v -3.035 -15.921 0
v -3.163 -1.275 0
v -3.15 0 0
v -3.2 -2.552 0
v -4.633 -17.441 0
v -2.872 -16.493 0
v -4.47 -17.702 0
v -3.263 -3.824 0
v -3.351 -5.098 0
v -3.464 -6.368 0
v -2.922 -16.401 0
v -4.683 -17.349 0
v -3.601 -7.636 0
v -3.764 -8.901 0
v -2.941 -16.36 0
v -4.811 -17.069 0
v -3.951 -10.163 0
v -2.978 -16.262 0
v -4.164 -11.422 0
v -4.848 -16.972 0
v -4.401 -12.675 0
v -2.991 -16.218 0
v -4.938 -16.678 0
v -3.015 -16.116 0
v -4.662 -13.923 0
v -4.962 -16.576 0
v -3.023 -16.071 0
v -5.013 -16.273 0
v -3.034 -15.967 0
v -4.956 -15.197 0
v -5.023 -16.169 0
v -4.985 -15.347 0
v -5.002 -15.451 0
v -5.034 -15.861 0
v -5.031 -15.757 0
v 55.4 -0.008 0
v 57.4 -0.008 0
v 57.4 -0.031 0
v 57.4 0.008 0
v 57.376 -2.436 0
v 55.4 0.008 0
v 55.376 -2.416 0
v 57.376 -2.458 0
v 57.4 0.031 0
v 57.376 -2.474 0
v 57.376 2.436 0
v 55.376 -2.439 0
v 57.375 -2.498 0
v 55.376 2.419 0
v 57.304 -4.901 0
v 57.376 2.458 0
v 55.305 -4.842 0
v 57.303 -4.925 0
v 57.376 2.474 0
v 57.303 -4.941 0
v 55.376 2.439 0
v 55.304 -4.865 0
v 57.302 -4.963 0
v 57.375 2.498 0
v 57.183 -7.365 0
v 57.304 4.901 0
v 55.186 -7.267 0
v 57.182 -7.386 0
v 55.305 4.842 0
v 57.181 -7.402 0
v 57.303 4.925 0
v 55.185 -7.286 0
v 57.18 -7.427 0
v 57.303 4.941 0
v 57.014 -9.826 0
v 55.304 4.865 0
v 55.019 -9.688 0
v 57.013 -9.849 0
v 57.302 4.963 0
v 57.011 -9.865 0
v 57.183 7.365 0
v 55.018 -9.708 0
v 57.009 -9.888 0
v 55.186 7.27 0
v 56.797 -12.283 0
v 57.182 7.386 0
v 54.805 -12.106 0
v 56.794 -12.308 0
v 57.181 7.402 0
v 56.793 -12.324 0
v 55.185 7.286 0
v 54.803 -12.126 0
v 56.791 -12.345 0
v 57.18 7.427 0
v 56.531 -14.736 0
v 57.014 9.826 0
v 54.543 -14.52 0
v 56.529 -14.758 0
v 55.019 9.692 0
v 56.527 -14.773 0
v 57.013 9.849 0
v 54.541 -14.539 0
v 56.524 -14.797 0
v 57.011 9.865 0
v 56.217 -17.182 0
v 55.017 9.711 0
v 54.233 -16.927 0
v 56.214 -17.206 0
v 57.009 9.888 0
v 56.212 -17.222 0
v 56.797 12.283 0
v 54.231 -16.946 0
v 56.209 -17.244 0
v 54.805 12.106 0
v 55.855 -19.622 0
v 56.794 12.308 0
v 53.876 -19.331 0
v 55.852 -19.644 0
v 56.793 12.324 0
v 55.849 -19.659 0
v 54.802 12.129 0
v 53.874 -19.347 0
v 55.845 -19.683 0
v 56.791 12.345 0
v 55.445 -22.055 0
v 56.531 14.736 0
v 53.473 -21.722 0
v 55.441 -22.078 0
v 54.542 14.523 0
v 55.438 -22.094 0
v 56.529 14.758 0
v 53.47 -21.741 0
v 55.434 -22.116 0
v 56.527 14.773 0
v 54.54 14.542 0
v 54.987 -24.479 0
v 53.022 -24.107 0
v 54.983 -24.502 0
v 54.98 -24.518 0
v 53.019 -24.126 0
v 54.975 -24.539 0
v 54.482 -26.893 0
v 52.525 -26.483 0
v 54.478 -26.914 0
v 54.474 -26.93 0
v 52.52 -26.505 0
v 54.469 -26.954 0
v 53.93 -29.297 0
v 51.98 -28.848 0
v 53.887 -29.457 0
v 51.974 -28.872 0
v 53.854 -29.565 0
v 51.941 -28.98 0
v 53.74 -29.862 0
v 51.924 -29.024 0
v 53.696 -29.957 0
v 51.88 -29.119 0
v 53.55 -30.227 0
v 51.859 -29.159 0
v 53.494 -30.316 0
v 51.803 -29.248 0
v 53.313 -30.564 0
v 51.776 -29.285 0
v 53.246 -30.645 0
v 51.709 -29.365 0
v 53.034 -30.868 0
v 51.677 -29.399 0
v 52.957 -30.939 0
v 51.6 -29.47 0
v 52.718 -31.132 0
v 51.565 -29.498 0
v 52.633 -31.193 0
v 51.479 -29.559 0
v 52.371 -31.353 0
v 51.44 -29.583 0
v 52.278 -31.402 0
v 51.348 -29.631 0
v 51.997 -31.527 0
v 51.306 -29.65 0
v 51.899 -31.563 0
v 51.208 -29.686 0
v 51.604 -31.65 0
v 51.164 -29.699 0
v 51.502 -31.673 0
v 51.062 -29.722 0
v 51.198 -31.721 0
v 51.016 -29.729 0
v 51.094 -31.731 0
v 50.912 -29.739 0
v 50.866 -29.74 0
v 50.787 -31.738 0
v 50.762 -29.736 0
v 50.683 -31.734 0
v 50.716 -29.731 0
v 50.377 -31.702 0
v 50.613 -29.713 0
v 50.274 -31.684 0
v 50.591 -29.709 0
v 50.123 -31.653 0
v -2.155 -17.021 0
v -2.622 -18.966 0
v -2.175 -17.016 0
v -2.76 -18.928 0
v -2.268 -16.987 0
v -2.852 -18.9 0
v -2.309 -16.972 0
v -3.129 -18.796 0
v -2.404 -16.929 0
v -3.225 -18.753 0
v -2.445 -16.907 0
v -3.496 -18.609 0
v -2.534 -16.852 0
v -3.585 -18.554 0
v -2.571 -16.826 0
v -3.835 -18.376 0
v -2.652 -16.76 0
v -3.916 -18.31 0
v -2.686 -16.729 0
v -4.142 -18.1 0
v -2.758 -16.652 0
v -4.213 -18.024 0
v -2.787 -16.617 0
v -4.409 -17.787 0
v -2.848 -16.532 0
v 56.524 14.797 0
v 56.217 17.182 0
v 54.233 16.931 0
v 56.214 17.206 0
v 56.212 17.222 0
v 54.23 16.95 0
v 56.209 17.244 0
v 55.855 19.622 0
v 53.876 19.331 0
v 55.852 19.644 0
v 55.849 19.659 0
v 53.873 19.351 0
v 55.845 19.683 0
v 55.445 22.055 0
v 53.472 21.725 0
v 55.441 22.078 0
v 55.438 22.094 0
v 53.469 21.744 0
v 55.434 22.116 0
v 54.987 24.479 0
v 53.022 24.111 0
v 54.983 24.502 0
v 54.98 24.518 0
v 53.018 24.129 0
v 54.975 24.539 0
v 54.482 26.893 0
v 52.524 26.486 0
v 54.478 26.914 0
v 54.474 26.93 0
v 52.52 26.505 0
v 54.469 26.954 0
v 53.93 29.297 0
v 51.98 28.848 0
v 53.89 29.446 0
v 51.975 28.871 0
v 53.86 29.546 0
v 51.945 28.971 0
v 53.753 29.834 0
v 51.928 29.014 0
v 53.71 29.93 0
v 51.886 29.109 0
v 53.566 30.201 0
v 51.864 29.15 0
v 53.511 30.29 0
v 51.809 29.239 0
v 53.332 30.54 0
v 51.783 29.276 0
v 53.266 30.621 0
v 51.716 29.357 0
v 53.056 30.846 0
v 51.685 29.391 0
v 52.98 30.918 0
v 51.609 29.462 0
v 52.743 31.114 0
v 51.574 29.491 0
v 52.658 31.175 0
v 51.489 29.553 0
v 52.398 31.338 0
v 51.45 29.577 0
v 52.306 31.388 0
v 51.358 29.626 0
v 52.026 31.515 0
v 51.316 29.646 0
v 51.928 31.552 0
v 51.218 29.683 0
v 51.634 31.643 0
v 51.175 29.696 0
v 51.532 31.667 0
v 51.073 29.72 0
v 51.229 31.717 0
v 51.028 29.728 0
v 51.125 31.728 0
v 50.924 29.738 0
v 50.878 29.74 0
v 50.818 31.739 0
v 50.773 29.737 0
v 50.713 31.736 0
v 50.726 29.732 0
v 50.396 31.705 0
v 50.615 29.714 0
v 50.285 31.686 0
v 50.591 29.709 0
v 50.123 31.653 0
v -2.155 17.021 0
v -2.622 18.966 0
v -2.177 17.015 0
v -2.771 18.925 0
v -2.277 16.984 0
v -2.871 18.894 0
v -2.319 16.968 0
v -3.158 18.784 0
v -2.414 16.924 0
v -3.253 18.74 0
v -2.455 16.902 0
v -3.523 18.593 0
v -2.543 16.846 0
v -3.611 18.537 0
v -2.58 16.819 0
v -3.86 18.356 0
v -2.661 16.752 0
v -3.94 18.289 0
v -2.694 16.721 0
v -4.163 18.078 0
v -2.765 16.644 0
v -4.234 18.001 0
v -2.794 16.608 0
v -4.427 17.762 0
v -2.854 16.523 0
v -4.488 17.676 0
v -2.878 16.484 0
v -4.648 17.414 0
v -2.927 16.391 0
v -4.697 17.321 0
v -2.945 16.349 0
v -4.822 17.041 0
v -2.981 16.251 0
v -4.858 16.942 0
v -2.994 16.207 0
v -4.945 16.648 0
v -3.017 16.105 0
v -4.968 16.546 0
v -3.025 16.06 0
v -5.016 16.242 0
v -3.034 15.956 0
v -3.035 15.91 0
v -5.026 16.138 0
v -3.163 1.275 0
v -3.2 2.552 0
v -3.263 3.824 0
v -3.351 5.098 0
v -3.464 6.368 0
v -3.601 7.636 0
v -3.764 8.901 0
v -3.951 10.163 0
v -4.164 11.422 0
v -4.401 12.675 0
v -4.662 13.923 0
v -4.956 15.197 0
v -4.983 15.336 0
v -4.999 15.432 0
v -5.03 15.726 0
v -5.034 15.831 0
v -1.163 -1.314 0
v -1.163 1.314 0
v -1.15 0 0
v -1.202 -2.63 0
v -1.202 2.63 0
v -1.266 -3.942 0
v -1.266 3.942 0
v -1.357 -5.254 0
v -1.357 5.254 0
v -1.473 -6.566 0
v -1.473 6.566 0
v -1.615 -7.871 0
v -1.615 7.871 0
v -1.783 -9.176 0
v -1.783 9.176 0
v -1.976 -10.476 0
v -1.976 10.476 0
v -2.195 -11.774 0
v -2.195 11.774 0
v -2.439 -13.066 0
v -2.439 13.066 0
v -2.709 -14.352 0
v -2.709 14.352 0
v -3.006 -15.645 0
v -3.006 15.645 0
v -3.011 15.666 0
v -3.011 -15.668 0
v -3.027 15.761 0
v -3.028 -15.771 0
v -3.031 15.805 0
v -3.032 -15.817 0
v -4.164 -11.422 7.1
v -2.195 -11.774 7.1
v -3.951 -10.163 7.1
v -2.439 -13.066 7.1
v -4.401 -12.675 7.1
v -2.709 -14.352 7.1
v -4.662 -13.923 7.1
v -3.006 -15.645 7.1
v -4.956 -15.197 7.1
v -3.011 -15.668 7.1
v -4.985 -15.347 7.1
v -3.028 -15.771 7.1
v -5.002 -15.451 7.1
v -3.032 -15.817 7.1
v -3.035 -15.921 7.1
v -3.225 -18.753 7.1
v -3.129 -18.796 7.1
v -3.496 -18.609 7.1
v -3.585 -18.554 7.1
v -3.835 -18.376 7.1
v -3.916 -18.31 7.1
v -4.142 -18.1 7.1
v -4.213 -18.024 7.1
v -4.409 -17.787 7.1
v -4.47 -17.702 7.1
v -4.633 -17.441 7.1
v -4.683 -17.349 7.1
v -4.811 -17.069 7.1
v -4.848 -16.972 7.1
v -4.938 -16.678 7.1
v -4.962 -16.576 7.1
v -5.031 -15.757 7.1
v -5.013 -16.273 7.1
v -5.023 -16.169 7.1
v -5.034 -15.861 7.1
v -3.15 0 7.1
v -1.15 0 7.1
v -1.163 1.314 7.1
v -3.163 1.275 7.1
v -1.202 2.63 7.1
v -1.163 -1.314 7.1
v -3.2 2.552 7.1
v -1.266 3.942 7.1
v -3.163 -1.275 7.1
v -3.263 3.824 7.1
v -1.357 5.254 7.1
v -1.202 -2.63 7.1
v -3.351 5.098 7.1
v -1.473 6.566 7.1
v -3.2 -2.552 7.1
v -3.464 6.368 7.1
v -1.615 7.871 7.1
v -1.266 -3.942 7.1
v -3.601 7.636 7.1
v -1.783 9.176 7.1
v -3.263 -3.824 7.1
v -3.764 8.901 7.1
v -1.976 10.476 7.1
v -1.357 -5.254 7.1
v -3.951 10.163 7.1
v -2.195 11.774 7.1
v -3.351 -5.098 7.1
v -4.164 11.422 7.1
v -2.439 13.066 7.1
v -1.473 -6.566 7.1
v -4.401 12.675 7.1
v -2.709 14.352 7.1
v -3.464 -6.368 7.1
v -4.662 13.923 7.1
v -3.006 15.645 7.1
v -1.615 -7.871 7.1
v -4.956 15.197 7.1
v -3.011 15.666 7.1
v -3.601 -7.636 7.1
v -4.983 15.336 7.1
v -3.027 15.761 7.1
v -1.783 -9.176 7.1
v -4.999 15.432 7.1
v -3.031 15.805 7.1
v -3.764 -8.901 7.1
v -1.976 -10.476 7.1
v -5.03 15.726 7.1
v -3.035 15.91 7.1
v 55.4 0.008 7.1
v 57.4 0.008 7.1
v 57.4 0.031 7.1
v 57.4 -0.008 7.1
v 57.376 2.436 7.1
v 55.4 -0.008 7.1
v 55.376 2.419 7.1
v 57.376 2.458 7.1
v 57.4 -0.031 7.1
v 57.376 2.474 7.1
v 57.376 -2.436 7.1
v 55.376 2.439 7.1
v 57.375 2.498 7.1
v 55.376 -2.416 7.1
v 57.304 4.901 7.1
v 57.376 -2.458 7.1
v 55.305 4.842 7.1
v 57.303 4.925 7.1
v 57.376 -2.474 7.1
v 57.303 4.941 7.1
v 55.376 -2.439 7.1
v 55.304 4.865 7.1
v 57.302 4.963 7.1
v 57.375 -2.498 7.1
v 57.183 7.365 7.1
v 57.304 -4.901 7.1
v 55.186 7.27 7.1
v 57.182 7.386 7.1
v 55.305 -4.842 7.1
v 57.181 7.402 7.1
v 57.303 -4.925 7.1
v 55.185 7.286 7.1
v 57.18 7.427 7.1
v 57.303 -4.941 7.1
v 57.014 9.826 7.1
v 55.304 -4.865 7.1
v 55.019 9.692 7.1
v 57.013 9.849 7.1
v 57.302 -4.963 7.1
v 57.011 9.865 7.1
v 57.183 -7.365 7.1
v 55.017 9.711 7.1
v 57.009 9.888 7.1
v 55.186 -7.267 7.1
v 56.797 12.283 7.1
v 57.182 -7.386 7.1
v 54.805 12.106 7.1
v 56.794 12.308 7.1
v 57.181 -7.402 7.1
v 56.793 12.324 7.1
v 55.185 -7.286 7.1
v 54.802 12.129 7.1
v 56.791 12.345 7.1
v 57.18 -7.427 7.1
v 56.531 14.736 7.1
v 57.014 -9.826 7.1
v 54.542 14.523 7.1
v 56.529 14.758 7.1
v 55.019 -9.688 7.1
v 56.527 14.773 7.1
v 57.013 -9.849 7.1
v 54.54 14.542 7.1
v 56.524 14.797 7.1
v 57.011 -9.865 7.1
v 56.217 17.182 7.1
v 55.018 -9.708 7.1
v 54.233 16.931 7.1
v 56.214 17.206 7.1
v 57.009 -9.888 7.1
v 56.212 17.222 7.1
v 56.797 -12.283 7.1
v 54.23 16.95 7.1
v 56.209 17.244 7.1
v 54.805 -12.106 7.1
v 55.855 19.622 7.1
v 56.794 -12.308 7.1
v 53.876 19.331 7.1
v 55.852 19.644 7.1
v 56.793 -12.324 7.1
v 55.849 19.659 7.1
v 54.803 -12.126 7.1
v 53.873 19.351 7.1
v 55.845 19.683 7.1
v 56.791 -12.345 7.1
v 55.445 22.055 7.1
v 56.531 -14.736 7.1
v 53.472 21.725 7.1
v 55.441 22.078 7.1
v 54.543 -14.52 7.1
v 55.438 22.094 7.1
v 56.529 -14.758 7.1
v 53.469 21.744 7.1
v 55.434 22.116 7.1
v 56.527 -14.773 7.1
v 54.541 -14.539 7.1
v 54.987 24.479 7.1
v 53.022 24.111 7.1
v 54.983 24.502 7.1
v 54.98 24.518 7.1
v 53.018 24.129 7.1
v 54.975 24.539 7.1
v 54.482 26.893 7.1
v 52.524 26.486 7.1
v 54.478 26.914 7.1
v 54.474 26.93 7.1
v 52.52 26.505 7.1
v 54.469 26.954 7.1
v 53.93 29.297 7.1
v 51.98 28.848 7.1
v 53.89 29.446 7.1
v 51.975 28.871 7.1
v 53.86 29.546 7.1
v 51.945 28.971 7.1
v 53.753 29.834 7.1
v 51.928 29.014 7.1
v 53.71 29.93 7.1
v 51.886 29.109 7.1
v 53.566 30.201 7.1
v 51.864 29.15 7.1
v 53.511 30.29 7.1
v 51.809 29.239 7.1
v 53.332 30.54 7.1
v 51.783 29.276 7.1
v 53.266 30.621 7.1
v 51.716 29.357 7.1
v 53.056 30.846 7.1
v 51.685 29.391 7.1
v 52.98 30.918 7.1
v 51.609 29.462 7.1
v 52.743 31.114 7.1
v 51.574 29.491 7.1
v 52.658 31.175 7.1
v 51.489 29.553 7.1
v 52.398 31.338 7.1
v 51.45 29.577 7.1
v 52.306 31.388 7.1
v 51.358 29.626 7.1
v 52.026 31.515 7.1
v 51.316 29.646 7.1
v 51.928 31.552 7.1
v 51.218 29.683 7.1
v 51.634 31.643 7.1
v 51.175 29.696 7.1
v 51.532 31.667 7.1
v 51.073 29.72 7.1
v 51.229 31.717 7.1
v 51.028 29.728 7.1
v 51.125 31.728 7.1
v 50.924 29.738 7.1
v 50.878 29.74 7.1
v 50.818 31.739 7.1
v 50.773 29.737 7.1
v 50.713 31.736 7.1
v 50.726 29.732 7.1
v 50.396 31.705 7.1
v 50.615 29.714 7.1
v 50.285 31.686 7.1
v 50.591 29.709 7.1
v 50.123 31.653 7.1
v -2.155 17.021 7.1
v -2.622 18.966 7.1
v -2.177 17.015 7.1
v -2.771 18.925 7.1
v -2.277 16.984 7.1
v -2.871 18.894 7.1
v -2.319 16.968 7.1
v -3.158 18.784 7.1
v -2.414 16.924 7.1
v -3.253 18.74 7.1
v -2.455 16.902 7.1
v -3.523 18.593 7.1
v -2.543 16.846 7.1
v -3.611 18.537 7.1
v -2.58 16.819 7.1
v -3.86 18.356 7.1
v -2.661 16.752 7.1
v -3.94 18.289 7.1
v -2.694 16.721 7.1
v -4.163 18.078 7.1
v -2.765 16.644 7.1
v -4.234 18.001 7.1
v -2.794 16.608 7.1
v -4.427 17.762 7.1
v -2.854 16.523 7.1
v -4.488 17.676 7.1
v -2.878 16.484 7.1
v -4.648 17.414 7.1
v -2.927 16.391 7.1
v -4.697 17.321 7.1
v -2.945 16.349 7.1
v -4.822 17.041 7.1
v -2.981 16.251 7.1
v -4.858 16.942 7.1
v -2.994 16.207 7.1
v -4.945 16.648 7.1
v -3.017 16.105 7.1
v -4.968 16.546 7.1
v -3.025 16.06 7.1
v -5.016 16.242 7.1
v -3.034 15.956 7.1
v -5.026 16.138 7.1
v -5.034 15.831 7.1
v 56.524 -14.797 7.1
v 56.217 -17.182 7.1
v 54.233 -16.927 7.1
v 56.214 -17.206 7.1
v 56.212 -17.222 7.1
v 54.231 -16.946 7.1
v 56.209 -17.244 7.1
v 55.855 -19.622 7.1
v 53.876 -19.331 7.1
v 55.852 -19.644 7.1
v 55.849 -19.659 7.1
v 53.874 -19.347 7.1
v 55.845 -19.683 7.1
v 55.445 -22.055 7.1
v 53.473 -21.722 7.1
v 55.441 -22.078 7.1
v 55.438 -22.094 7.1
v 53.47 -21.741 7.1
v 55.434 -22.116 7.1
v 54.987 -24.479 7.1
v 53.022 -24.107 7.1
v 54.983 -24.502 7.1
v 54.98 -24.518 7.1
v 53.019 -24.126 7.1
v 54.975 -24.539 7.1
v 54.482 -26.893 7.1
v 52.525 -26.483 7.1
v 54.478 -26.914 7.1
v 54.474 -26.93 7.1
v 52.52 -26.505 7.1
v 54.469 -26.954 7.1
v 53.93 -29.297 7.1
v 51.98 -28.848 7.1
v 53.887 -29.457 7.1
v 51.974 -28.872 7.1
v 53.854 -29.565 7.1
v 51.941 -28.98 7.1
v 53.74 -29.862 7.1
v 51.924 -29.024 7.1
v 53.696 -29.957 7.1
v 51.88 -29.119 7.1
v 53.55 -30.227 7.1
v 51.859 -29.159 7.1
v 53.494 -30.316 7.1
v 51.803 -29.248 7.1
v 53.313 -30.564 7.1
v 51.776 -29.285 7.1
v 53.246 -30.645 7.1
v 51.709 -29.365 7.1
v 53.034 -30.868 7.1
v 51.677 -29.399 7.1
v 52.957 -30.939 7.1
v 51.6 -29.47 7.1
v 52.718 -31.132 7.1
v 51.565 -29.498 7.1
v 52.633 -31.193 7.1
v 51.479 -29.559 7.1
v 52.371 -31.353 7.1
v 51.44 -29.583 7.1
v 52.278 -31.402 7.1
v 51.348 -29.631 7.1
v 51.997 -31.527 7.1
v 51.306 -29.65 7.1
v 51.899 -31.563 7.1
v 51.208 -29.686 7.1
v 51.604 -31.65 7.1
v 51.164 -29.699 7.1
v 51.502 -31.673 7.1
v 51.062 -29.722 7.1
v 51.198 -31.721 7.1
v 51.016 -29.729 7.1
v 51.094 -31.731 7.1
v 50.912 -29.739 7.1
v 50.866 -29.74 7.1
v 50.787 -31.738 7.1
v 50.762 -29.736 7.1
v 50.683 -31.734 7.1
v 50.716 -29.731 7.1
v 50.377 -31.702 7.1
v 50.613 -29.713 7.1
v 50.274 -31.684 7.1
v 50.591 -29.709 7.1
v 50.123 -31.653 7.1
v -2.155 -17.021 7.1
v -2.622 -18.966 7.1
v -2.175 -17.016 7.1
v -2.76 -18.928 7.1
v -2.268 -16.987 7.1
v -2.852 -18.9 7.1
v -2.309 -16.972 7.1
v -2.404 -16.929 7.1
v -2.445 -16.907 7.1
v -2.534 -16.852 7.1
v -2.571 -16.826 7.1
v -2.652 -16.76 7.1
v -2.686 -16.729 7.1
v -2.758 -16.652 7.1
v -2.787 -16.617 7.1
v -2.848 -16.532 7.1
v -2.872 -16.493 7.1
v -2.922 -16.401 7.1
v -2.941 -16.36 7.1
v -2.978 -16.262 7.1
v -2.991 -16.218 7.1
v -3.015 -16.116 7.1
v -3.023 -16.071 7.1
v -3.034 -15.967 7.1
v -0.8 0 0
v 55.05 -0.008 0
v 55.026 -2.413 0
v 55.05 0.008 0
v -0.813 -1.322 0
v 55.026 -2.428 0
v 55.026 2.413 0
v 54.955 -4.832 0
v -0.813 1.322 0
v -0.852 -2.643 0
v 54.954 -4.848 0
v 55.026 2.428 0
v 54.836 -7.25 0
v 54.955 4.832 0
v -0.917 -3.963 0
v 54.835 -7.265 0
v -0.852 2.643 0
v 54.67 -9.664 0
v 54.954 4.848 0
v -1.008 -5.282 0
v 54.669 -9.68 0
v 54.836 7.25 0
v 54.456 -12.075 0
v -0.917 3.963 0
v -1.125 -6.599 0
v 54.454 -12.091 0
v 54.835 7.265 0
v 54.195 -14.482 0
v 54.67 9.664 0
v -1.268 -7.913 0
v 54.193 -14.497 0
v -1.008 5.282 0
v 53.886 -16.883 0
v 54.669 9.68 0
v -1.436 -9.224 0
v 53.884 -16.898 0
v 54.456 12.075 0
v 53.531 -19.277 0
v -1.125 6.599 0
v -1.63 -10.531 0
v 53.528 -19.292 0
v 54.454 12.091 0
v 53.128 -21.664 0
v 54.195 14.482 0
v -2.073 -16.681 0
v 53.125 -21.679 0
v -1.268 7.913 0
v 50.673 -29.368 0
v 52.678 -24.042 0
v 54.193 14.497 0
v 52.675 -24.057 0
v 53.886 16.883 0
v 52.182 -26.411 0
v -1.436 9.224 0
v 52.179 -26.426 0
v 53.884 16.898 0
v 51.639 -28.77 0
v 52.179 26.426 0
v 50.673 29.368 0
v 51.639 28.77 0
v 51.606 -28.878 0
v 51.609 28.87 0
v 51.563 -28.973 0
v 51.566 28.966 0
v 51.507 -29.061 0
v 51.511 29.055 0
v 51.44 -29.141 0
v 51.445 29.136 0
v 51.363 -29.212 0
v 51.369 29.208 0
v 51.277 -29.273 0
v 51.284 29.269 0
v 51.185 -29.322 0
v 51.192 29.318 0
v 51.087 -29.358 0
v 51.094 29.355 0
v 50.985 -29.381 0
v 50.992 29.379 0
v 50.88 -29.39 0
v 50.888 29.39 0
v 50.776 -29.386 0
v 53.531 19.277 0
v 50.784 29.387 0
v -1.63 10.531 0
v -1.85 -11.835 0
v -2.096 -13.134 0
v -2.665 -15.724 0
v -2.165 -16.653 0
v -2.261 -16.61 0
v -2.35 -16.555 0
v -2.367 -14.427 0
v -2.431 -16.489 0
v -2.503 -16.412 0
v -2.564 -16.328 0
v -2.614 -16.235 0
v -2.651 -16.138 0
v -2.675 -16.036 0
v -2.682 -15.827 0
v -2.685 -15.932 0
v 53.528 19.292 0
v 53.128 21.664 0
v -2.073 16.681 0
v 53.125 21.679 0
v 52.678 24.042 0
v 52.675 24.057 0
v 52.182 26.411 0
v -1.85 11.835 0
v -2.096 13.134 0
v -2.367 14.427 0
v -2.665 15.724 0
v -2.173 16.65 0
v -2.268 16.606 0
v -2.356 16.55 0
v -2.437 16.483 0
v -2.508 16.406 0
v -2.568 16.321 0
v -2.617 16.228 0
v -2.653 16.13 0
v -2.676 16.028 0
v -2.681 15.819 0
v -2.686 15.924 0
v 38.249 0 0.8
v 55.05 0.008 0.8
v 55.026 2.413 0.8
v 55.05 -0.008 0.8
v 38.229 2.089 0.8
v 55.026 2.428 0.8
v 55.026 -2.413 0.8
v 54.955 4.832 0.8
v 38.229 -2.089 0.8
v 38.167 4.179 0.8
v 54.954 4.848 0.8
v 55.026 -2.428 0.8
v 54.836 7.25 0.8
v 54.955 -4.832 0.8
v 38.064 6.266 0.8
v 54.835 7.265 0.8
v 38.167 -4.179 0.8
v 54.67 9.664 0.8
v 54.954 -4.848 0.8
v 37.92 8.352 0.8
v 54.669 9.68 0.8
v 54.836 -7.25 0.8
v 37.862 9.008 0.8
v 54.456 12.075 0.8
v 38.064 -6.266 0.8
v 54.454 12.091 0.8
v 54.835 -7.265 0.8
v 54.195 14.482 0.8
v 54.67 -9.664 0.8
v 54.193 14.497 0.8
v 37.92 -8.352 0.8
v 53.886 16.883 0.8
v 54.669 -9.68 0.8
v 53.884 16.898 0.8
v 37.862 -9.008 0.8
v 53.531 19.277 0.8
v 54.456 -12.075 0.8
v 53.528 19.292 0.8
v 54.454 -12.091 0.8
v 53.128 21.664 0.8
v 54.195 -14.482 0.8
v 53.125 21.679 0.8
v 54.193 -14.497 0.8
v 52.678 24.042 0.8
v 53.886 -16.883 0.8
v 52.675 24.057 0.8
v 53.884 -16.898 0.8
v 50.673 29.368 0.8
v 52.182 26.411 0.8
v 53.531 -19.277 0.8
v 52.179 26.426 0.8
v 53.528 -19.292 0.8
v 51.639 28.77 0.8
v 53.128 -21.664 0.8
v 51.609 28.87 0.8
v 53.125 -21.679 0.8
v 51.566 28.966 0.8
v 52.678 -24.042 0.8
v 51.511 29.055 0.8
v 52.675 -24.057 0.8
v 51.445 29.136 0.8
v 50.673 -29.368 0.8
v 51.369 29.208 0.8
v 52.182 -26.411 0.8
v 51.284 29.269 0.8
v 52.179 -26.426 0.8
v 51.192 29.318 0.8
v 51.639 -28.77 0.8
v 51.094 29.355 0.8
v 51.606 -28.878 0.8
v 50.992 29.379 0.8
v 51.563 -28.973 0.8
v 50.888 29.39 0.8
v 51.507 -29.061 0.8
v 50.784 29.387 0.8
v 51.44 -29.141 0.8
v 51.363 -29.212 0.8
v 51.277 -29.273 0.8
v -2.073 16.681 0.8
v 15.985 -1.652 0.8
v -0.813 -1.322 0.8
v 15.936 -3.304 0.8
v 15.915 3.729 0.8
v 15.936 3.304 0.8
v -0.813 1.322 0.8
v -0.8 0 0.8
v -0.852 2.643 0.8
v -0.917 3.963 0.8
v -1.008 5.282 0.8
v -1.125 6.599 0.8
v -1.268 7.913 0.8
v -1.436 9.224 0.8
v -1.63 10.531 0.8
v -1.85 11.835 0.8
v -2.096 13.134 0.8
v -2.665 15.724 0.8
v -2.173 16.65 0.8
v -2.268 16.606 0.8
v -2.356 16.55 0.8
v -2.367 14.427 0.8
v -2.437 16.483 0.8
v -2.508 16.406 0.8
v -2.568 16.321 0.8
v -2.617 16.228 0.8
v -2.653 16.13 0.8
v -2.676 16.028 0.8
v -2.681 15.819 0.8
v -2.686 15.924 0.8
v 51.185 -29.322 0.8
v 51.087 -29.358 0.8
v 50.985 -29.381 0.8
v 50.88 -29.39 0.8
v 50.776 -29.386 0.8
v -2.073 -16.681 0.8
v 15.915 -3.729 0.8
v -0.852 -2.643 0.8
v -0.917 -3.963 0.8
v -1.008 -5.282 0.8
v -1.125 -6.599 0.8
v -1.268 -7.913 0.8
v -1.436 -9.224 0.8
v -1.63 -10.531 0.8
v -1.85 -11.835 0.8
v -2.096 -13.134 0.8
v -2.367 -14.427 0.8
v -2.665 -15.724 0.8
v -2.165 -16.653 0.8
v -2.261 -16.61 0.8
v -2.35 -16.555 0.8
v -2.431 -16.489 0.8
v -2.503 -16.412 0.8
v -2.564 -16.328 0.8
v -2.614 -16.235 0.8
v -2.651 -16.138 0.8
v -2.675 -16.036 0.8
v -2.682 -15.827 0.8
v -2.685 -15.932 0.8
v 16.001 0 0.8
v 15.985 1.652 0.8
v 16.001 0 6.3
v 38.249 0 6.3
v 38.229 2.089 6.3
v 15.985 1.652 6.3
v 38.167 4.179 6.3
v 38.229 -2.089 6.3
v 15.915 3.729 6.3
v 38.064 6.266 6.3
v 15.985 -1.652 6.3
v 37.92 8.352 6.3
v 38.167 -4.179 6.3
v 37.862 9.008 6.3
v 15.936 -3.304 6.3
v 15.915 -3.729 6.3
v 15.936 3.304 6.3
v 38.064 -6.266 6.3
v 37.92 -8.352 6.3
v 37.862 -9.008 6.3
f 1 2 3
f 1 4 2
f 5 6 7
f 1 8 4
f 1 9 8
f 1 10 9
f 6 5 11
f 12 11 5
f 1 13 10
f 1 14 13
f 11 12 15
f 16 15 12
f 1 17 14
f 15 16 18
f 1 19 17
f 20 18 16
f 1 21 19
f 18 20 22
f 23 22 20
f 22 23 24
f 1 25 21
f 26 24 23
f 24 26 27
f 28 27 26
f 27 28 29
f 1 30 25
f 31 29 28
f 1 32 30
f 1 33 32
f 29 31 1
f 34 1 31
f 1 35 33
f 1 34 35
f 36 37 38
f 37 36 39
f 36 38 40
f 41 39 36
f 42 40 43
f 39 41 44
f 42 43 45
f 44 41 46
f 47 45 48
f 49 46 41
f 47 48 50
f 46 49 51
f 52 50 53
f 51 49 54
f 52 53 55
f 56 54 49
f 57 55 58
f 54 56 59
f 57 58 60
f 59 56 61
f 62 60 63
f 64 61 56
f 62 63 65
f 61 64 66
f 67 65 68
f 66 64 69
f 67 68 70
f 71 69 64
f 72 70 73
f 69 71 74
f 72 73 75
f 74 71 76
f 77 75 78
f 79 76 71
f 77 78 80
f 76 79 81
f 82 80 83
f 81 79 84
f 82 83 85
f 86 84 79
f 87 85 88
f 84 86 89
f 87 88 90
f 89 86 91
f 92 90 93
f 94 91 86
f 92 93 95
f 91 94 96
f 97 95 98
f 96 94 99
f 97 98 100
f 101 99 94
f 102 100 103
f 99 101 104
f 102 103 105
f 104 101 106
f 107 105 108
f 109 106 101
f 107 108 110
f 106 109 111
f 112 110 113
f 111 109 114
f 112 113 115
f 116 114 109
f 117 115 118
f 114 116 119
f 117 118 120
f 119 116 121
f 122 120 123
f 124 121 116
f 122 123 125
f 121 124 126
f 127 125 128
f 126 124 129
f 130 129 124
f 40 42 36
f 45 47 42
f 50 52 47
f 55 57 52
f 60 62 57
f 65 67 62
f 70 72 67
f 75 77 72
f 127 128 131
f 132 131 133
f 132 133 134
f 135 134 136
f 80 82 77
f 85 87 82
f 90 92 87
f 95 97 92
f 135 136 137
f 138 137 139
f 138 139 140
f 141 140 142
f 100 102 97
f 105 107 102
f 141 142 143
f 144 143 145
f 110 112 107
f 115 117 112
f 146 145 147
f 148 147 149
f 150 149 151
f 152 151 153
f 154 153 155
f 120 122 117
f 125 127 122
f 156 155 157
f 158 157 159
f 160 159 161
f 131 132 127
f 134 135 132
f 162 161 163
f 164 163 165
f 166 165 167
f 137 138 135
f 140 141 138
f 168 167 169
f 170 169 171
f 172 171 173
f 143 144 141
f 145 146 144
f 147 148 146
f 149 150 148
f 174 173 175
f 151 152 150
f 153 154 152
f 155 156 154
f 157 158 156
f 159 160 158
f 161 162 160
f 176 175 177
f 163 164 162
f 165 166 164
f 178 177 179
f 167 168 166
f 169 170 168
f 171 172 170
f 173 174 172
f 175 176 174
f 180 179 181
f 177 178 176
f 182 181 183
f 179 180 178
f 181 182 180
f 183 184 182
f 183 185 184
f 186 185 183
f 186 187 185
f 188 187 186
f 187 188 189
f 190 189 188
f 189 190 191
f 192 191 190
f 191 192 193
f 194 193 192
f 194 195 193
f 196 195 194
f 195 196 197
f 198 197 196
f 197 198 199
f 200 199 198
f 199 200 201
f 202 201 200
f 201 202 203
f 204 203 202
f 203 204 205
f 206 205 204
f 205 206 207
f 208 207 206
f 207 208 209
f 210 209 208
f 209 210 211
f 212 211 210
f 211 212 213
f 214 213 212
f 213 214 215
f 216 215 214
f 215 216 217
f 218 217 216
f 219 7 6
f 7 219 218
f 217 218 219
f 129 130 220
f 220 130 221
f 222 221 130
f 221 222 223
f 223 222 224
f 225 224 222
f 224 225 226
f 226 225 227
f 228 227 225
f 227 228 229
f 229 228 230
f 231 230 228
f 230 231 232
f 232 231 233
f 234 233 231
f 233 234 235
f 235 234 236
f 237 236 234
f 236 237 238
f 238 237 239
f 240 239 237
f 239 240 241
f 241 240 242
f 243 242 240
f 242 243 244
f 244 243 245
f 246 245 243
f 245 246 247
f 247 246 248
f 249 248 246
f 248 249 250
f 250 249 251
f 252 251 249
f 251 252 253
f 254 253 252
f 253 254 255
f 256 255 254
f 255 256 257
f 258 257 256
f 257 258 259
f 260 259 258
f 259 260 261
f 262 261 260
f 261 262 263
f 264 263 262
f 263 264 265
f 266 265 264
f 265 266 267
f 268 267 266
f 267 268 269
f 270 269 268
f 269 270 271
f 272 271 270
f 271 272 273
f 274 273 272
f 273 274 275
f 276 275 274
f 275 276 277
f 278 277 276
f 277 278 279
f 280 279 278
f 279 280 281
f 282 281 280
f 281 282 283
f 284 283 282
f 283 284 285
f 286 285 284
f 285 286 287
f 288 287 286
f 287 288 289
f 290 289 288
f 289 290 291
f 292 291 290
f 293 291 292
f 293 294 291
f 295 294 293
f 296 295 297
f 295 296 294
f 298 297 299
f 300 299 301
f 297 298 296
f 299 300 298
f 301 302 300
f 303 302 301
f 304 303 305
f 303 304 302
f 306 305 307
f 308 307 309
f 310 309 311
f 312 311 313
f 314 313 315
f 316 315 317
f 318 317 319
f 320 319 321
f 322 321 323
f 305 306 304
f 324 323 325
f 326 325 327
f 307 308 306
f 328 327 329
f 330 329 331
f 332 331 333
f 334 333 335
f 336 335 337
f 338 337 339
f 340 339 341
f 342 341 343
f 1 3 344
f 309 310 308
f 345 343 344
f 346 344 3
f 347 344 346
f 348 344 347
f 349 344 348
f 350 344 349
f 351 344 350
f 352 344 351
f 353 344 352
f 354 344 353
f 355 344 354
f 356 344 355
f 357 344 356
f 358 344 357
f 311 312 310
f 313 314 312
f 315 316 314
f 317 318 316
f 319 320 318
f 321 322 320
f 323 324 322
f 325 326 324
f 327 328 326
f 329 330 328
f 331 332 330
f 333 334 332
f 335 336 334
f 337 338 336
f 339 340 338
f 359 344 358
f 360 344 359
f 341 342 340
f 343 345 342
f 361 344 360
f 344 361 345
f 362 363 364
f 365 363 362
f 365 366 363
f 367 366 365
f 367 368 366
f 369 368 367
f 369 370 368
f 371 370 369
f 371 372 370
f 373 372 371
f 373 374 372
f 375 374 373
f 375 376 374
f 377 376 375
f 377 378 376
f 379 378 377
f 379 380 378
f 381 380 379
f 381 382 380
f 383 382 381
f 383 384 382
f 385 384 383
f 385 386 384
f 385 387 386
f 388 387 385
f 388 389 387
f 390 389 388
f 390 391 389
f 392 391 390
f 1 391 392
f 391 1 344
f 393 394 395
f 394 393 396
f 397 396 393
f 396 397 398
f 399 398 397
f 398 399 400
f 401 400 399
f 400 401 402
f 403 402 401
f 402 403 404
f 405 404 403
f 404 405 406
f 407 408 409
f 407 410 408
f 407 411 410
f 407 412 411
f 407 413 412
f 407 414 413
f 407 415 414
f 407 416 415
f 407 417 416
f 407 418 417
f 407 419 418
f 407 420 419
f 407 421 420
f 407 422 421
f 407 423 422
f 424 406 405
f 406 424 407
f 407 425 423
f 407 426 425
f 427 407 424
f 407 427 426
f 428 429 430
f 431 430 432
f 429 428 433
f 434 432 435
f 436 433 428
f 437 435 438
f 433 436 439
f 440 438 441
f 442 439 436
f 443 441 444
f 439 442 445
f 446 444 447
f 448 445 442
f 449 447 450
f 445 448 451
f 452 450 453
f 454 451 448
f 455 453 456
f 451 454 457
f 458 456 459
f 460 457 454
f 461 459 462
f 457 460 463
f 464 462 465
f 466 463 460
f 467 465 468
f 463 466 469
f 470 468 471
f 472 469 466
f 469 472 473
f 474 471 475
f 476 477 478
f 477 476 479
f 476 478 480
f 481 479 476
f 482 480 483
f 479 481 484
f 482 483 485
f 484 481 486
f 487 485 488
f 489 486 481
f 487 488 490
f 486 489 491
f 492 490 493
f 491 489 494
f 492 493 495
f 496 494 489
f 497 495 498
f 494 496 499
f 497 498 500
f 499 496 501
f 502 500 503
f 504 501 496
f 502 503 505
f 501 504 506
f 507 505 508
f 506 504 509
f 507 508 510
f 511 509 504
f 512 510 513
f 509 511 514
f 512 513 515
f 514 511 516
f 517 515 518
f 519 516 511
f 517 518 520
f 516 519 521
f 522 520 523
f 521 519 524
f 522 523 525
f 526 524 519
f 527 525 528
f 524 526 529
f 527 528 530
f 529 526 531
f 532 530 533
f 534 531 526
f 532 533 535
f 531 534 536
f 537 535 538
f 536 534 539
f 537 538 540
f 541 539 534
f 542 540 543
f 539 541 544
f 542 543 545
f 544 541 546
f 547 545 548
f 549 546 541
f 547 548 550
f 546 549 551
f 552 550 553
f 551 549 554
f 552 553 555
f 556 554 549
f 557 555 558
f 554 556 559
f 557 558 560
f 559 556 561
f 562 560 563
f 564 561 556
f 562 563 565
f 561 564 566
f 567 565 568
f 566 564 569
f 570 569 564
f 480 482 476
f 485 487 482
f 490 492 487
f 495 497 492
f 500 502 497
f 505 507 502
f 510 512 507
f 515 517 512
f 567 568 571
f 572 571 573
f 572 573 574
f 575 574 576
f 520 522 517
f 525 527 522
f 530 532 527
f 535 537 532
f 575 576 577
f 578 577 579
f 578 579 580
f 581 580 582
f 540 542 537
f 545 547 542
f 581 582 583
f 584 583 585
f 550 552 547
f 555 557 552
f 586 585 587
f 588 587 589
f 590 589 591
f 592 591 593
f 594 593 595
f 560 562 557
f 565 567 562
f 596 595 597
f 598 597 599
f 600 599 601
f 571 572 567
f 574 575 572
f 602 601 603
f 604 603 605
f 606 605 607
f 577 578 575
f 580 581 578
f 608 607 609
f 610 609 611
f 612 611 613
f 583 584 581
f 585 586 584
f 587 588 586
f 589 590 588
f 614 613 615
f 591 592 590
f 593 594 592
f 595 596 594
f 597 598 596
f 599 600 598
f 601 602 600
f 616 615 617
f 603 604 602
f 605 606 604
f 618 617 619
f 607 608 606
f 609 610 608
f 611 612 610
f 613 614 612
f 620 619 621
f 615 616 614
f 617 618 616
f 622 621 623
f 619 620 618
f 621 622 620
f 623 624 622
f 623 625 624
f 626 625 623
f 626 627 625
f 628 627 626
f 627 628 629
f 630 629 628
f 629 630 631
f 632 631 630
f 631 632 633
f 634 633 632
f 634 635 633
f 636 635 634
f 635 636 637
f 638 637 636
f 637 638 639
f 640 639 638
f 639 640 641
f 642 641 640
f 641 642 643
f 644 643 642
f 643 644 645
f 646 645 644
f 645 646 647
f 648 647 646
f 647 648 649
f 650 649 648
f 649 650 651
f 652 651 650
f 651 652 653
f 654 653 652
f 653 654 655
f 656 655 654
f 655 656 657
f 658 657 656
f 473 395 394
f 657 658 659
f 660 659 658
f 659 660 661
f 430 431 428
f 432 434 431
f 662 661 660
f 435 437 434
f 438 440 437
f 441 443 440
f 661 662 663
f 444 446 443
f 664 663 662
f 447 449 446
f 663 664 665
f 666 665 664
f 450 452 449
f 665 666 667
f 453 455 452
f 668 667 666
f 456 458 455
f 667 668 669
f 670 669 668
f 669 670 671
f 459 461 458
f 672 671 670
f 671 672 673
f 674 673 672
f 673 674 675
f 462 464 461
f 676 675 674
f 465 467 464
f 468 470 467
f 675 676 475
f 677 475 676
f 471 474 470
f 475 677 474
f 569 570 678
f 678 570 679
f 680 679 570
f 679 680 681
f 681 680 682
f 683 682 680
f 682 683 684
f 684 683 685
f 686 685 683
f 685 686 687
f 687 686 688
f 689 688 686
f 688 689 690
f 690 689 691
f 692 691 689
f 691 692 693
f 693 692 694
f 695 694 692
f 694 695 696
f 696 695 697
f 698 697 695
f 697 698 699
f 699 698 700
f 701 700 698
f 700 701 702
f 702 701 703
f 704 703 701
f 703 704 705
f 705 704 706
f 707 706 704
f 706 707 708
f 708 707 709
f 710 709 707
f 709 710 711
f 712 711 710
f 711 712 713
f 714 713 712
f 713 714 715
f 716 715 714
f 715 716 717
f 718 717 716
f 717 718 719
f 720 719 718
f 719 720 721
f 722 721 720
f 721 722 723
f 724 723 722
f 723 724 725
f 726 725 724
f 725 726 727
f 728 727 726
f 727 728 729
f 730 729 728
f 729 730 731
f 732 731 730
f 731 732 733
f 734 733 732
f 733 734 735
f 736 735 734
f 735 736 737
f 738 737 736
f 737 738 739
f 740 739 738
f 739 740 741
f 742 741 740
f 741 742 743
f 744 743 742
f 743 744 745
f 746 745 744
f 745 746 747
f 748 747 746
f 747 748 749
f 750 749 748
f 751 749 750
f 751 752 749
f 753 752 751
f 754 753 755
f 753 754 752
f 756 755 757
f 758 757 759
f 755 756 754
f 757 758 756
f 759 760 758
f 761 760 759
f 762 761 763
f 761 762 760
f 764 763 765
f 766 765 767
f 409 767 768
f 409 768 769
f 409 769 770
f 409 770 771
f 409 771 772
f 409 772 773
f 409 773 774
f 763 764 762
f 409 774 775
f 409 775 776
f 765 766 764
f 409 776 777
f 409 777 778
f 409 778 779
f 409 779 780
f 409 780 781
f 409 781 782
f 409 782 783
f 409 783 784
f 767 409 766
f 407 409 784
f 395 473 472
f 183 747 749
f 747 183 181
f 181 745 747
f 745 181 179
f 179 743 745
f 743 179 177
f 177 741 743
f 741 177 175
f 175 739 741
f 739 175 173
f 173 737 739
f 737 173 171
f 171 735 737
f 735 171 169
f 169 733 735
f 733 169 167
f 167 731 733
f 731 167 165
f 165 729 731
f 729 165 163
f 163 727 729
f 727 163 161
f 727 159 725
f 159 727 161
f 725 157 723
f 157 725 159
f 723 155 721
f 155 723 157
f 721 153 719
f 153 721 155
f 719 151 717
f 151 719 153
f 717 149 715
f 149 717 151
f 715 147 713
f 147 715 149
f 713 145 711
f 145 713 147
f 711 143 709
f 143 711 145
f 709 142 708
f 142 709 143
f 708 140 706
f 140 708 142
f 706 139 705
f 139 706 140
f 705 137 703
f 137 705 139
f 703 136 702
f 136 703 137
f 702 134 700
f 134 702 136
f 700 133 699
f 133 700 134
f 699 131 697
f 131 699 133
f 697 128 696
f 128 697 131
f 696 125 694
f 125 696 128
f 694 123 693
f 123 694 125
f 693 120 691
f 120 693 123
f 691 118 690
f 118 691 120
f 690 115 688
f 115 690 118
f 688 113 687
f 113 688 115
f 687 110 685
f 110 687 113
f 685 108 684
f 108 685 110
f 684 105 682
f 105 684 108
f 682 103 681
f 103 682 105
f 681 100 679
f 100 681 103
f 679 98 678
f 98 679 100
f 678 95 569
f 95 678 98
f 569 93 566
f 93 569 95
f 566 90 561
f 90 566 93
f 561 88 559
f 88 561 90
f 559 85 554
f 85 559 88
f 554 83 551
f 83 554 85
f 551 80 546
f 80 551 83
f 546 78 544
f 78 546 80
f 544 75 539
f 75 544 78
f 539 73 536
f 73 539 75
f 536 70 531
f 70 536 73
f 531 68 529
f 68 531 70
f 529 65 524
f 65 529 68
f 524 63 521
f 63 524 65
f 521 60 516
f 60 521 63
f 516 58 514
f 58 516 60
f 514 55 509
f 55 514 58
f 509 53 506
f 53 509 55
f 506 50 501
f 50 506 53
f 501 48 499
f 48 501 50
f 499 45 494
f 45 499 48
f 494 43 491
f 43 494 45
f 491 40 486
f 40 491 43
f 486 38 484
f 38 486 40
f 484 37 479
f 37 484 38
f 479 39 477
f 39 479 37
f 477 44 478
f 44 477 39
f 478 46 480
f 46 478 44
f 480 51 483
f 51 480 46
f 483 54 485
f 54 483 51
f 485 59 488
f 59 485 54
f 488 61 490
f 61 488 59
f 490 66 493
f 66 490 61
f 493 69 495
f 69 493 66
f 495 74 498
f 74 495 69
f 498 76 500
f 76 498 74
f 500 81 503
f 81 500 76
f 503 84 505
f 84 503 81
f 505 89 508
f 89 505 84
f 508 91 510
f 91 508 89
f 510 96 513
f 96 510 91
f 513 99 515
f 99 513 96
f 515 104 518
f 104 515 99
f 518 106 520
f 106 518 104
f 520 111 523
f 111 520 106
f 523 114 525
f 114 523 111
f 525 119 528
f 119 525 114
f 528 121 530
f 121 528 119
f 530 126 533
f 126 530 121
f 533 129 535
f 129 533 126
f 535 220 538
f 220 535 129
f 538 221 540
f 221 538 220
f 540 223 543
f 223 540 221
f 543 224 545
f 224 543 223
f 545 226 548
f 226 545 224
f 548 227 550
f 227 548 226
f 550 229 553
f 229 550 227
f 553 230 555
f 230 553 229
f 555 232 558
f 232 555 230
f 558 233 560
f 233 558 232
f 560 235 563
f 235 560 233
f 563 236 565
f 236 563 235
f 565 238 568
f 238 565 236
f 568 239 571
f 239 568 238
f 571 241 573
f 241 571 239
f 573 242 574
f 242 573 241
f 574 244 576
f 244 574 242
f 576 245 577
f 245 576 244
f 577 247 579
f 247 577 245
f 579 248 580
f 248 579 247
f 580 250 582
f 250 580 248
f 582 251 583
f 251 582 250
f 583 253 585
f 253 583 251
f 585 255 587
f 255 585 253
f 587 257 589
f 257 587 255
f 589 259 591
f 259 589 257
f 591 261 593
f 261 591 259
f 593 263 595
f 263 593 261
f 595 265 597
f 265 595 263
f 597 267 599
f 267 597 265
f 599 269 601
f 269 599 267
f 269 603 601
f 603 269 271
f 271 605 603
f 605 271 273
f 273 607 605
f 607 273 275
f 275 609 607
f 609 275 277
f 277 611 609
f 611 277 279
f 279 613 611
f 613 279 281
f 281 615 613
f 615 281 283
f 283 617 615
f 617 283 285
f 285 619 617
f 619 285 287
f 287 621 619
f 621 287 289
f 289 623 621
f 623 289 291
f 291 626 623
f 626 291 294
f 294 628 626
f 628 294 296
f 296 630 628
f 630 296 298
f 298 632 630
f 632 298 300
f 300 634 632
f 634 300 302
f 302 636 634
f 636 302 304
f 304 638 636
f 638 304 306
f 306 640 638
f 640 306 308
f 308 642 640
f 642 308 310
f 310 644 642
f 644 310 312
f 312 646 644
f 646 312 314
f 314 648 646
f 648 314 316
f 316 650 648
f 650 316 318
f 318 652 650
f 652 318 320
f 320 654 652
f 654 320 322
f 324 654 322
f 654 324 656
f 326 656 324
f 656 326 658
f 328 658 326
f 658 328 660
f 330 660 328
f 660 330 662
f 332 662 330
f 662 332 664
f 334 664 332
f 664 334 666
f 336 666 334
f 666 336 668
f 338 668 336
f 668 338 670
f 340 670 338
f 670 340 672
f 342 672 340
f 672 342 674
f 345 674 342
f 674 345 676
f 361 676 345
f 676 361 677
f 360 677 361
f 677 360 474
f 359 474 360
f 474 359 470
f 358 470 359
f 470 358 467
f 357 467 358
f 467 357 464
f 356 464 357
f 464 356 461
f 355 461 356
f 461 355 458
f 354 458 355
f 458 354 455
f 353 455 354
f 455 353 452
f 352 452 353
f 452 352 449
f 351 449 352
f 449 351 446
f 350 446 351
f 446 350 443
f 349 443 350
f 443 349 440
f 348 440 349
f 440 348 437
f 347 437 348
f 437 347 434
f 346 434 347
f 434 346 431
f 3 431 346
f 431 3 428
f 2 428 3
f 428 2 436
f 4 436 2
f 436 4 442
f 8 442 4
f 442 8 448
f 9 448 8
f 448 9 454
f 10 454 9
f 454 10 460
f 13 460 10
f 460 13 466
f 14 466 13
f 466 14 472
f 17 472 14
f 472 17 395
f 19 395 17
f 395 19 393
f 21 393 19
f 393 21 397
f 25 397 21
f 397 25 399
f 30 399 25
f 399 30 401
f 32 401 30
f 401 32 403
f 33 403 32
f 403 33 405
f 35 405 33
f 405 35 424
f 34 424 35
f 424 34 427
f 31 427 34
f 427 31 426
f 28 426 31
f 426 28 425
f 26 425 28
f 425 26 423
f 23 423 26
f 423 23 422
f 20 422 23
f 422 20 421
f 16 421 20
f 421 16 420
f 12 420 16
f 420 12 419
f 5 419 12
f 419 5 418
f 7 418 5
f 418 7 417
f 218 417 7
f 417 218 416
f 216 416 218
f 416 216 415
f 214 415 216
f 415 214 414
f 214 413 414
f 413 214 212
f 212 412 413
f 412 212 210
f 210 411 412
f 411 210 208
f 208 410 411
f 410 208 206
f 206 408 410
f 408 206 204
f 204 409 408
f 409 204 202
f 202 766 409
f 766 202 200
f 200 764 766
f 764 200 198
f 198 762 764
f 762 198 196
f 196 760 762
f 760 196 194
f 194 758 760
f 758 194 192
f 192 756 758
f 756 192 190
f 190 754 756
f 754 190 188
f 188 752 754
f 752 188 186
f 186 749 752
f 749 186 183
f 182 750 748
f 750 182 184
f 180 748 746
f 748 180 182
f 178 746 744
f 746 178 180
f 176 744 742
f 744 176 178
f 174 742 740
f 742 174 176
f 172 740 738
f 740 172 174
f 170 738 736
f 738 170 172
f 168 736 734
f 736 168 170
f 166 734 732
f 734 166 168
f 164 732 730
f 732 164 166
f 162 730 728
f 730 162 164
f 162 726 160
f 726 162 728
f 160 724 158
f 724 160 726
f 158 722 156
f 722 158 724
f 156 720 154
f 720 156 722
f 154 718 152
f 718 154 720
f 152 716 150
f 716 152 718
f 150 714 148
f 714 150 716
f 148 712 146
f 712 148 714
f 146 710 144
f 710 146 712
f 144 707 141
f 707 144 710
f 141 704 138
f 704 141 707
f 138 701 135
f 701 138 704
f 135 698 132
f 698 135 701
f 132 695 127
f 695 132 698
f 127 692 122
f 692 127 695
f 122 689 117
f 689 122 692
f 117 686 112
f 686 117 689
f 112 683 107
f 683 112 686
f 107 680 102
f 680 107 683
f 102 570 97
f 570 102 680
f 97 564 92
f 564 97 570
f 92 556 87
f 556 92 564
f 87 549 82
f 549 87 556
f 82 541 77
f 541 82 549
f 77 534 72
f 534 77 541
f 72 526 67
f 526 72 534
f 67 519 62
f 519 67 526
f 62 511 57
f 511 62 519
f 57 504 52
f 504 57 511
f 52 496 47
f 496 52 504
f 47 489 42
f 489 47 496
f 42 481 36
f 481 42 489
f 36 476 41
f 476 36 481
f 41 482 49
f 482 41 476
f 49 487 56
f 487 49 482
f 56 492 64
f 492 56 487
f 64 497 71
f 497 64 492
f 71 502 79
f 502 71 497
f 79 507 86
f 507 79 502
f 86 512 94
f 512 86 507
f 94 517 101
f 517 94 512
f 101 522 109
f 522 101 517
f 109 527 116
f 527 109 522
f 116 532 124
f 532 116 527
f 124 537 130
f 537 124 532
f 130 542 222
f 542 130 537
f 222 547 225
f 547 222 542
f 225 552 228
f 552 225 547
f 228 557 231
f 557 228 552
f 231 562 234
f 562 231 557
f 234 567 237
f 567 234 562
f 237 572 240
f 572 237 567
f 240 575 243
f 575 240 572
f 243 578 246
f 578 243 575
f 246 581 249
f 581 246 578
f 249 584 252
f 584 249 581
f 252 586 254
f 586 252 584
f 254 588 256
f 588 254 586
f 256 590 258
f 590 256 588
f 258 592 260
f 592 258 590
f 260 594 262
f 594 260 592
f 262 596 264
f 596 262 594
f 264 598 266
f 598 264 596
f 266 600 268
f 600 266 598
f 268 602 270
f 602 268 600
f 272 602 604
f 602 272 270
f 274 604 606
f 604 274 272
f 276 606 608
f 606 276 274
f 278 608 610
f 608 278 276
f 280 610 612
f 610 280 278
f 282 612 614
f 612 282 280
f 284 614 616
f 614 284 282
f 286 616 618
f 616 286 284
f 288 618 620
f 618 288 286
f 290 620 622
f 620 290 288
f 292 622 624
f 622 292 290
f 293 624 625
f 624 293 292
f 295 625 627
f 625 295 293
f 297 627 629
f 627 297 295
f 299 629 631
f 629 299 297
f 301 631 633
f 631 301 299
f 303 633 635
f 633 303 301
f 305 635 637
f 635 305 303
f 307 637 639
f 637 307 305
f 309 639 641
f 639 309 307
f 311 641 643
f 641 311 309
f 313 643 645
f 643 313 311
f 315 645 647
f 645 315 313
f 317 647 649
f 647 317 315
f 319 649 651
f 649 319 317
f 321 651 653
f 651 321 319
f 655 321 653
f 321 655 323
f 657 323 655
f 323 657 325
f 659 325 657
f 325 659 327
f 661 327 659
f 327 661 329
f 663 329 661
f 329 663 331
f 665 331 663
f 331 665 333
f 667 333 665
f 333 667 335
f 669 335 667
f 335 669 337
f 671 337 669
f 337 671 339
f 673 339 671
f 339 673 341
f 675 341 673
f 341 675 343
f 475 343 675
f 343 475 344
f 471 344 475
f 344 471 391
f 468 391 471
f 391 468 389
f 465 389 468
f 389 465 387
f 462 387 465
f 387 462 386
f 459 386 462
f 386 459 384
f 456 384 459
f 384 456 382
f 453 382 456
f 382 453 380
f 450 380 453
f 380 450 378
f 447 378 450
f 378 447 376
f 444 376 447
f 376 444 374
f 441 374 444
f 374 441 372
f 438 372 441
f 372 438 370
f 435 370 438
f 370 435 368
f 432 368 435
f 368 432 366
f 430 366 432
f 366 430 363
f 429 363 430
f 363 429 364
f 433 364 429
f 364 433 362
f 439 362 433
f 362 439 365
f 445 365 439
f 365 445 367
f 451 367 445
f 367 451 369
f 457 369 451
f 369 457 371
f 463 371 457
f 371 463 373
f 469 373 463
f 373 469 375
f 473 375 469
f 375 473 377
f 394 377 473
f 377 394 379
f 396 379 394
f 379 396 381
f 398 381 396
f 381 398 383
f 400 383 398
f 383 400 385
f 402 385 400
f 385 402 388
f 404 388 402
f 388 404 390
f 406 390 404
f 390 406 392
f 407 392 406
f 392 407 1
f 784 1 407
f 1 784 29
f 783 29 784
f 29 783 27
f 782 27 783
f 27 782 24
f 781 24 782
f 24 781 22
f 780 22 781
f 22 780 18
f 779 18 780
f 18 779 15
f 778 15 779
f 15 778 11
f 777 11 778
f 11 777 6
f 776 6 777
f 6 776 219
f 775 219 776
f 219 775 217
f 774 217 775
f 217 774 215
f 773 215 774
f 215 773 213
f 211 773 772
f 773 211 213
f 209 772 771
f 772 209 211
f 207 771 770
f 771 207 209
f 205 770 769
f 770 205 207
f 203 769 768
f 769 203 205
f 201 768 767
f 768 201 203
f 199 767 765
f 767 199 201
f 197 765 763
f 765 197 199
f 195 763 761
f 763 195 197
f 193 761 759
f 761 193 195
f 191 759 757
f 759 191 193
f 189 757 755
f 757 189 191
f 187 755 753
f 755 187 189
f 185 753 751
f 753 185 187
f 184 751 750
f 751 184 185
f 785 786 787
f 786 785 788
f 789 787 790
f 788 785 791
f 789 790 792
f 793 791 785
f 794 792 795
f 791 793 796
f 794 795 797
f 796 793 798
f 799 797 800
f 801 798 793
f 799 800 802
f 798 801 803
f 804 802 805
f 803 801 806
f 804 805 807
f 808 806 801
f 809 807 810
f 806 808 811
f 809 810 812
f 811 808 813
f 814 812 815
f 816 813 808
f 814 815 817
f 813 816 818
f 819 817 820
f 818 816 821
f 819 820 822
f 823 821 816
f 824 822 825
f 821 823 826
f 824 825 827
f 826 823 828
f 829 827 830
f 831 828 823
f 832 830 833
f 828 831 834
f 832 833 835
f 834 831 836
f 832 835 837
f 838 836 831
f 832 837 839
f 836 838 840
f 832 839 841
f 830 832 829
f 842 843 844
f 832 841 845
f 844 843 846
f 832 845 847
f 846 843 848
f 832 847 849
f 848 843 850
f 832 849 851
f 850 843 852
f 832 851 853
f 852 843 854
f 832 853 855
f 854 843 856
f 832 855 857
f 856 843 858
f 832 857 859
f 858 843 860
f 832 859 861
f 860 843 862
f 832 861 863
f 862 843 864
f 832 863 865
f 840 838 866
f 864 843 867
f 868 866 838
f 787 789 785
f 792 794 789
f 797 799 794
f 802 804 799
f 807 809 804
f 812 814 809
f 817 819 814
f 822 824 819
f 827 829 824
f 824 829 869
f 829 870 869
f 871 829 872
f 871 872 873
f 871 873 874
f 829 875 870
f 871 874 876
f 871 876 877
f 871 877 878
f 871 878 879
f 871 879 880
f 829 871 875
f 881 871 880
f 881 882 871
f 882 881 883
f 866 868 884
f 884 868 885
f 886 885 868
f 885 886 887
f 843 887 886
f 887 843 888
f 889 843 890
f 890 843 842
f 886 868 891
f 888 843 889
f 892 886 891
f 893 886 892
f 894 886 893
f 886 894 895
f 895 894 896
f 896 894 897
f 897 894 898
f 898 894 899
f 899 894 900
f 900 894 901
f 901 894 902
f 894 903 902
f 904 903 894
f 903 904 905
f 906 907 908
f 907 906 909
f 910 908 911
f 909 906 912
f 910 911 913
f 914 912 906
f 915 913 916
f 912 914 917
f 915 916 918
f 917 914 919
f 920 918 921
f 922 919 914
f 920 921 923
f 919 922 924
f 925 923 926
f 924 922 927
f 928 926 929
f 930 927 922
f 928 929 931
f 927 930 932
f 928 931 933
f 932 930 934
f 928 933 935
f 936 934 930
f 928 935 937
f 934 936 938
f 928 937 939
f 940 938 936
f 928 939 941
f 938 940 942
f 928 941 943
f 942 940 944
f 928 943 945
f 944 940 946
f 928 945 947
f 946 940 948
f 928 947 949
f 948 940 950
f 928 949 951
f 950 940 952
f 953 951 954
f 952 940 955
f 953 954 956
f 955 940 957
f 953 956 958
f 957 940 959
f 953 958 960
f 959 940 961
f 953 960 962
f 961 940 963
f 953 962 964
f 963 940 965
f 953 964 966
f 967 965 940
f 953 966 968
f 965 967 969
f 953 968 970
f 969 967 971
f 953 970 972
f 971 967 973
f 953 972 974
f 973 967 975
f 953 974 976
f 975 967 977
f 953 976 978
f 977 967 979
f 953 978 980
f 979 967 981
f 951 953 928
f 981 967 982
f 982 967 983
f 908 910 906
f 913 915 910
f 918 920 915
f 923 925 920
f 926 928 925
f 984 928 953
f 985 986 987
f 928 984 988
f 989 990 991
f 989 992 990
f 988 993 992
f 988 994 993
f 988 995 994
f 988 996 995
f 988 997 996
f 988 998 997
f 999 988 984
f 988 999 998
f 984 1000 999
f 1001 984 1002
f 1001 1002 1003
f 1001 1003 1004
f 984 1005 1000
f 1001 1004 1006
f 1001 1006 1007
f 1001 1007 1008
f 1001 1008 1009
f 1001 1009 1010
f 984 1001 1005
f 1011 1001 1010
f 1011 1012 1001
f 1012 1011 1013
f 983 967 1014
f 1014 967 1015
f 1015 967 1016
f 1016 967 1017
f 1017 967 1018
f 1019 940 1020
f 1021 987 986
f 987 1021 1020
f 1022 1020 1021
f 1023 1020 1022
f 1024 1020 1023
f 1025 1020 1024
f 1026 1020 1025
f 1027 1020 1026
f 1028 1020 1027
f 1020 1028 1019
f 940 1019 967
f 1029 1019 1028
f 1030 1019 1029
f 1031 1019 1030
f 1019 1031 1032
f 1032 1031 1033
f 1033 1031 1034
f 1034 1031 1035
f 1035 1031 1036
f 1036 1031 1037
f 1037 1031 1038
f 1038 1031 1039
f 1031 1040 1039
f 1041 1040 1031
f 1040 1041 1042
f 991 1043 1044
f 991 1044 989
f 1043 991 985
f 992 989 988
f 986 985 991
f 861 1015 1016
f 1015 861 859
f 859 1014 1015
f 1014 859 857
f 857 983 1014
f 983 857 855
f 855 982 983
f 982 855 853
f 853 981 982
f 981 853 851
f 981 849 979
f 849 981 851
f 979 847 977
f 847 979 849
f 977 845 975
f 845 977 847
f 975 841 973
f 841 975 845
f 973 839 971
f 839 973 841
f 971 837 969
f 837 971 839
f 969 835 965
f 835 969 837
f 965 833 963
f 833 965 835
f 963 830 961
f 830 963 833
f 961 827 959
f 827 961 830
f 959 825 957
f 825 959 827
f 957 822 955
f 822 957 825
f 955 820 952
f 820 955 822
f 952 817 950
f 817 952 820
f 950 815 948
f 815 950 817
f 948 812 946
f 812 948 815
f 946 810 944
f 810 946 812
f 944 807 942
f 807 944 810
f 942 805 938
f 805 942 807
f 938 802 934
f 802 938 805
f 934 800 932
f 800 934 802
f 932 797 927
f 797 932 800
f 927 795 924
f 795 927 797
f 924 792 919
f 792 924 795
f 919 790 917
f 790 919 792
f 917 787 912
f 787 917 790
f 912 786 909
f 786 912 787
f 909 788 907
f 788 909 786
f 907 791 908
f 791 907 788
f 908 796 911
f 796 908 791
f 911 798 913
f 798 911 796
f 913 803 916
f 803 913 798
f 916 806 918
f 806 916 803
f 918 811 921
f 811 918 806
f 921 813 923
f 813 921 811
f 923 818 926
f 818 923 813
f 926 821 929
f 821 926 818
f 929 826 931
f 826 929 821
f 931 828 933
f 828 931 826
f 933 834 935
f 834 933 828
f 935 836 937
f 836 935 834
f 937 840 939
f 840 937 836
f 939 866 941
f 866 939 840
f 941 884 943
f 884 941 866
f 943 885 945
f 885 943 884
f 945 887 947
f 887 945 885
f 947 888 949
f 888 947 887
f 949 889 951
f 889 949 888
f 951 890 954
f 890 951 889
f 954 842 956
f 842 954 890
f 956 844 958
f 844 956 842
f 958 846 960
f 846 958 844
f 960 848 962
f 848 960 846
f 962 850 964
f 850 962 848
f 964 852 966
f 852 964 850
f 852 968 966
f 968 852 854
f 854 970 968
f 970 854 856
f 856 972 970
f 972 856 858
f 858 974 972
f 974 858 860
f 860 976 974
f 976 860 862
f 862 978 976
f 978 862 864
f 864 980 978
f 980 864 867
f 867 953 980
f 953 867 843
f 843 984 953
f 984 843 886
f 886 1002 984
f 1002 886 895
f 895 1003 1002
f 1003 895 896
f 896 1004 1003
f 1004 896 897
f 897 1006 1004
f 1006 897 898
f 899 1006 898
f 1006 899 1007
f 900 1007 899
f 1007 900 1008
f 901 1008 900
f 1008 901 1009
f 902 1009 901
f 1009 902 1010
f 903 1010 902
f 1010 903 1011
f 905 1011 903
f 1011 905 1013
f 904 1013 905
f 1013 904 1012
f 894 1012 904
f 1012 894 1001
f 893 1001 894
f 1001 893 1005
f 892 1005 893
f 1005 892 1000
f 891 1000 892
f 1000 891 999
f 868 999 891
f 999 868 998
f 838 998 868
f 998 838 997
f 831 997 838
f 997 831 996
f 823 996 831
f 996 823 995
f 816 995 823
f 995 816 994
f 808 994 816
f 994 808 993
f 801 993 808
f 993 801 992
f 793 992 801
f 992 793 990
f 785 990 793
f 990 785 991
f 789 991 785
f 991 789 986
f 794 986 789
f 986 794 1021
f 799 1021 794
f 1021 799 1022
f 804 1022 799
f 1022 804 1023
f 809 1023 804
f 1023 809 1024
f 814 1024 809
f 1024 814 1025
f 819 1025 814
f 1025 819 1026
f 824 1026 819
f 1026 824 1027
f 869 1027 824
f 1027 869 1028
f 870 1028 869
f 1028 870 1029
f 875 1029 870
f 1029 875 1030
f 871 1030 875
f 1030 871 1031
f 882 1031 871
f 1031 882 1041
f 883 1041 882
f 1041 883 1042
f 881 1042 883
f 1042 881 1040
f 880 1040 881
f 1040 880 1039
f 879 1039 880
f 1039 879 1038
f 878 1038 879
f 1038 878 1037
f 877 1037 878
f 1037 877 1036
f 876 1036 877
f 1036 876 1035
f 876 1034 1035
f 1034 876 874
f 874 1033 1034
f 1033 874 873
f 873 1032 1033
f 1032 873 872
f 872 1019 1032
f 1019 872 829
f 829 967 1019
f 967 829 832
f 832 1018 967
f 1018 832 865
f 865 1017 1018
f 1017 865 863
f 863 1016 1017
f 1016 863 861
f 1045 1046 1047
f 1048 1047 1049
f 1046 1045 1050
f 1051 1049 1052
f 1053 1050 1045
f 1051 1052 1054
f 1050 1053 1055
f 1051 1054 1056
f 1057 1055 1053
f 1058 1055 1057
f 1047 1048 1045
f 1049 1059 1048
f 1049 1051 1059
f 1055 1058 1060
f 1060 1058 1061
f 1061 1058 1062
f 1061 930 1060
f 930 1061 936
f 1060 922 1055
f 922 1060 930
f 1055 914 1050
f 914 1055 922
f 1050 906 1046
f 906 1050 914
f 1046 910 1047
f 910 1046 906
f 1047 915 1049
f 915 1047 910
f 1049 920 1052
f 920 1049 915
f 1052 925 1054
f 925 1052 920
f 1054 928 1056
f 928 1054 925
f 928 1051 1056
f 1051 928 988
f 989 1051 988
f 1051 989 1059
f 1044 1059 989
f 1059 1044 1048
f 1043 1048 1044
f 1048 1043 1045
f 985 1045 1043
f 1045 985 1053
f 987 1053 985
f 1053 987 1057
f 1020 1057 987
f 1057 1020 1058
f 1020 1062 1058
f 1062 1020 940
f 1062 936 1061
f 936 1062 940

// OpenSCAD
// Gen-DD — fit coupon (bay part): O20/O5 THROUGH pockets at carrier thickness (test on a steel offcut), 608 seat,
// D-flat bore, gap shim, and one bobbin-bay slice (bobbin footprint + bay_clear) to test former fit.
include <parameters.scad>;
$fn = 48;
// D-flat keyed bore: flat faces +X (angle 0 = magnet pocket 0 = index notch)
module dflat_bore(h) {
    intersection() {
        cylinder(d=shaft_bore, h=h);
        translate([-shaft_bore, -shaft_bore, 0]) cube([shaft_bore + dflat_x, 2*shaft_bore, h]);
    }
}
module sector_2d(r_in, r_out, ang) {
    polygon([
        for (a = [-ang/2 : ang/24 : ang/2]) [r_in*cos(a), r_in*sin(a)],
        for (a = [ang/2 : -ang/24 : -ang/2]) [r_out*cos(a), r_out*sin(a)]
    ]);
}
module footprint_2d() { offset(r=wall) sector_2d(coil_id_r, coil_od_r, span_deg); }
module hub_2d()       { offset(delta=-coil_core_inset) sector_2d(coil_id_r, coil_od_r, span_deg); }

// bay slice at FULL stator thickness with one bobbin BASE printed IN PLACE inside it (bay_clear gap): this is the
// print-in-place test for the one-plate stator. After printing, the base must pop out with finger pressure; if it is fused,
// print coil_former.stl separately (print-packs/parts/) instead of using the in-place bases.
translate([-coil_id_r, 0, 0]) {
    difference() {
        linear_extrude(stator_thick) offset(r=bay_clear + 2) footprint_2d();
        translate([0, 0, -0.1]) linear_extrude(stator_thick + 0.2) offset(r=bay_clear) footprint_2d();
    }
    union() {
        linear_extrude(flange_t) footprint_2d();
        translate([0, 0, flange_t - 0.01]) linear_extrude(former_web + 0.01) hub_2d();
    }
}
